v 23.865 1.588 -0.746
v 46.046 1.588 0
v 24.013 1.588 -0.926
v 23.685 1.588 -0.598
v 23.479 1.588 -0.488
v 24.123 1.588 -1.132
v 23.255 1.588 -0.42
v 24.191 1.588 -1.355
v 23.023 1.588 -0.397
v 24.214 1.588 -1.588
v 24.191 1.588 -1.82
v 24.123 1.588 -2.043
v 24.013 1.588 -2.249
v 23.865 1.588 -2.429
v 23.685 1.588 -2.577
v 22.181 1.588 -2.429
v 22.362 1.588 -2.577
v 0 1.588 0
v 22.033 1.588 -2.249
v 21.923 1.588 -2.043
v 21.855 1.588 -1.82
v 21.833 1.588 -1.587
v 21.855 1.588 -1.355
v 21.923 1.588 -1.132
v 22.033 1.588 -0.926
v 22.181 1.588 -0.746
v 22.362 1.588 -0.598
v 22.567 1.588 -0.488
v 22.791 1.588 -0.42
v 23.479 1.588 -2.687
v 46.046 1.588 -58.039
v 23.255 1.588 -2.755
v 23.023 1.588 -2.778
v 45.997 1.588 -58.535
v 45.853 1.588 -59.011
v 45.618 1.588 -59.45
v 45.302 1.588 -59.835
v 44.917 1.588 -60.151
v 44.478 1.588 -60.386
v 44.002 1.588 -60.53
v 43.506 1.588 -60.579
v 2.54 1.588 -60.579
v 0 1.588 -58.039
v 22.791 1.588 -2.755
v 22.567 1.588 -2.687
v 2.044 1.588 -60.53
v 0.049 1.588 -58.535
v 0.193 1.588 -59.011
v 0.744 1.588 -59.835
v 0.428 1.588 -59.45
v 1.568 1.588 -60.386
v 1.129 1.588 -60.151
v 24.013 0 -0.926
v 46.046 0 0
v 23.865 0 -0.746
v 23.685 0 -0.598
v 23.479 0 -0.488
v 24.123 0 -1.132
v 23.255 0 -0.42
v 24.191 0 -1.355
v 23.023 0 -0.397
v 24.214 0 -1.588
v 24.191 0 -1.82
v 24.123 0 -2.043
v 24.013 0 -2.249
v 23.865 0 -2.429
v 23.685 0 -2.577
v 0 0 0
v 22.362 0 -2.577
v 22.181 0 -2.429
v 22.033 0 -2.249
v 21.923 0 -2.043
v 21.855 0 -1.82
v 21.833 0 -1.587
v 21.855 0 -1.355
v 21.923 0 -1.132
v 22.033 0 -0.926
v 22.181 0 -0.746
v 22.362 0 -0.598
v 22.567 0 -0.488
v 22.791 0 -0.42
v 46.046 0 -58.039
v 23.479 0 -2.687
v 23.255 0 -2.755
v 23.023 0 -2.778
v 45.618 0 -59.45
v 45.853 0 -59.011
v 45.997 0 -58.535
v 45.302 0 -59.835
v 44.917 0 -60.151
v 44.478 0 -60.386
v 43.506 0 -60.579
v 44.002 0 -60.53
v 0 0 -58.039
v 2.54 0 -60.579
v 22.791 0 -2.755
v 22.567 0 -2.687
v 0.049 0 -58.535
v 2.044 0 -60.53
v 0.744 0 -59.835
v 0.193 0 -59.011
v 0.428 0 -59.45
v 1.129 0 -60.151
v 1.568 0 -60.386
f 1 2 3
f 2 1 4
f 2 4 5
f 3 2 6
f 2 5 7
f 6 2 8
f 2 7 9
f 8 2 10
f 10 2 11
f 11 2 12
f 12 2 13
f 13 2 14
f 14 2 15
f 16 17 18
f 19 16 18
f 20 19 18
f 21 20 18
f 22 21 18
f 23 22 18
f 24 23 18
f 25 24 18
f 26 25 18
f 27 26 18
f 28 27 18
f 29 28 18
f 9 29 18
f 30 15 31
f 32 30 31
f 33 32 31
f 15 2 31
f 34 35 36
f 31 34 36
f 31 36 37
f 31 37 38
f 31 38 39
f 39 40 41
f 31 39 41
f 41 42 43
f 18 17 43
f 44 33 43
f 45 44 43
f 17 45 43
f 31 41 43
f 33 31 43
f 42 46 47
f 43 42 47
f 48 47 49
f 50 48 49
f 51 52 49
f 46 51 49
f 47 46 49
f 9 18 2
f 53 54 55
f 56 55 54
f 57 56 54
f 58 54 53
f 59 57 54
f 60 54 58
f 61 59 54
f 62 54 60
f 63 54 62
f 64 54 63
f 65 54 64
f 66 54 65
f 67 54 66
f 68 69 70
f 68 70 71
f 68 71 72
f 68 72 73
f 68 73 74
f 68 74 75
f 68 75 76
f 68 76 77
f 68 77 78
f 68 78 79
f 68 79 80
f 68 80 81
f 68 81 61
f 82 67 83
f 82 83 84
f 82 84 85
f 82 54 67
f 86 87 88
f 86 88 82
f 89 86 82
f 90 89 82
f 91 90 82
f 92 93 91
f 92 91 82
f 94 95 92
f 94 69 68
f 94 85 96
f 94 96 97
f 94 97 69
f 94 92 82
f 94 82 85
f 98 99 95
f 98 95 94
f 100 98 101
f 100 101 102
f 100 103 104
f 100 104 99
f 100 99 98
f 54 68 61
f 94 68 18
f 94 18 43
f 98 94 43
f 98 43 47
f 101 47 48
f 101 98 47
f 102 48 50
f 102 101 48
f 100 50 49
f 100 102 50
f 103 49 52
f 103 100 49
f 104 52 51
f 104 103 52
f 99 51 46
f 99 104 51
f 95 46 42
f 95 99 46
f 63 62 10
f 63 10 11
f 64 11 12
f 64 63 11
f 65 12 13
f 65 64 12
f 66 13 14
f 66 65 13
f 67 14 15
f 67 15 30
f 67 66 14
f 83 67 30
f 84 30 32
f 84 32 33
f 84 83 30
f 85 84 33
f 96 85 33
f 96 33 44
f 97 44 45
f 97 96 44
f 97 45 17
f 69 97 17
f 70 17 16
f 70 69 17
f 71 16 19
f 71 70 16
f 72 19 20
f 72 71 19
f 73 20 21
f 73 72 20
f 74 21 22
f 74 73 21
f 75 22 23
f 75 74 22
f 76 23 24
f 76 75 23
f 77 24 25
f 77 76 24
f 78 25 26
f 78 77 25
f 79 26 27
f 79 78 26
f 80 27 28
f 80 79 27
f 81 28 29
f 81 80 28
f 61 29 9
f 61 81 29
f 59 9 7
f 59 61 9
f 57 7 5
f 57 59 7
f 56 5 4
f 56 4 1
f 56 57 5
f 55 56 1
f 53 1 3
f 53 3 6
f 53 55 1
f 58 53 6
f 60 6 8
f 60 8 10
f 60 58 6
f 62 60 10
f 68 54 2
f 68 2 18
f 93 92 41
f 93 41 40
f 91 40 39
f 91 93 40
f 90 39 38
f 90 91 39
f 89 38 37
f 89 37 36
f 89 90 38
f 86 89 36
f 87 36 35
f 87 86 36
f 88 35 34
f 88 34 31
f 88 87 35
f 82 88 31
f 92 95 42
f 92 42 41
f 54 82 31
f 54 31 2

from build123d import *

# Parameters (mm, degrees)
SKETCH1_R           = 1.190625
BOSS_EXTRUDE1_DEPTH = 1.5875


with BuildPart() as part:
    # Sketch1 → Boss-Extrude1 (new body)
    with BuildSketch(Plane(origin=(0, 0, 0), x_dir=(1, 0, 0), z_dir=(0, 1, 0))):
        with BuildLine():
            Line((2.54, 60.579), (43.50625616, 60.579))
            ThreePointArc((43.50625616, 60.579), (45.302307384, 59.835051224), (46.04625616, 58.039))
            Line((46.04625616, 58.039), (46.04625616, 0))
            Line((46.04625616, 0), (0, 0))
            Line((0, 0), (0, 58.039))
            ThreePointArc((0, 58.039), (0.743948776, 59.835051224), (2.54, 60.579))
        make_face()
        with Locations((23.02312808, 1.5875)):
            Circle(SKETCH1_R, mode=Mode.SUBTRACT)
    extrude(amount=BOSS_EXTRUDE1_DEPTH)


solid = part.part
